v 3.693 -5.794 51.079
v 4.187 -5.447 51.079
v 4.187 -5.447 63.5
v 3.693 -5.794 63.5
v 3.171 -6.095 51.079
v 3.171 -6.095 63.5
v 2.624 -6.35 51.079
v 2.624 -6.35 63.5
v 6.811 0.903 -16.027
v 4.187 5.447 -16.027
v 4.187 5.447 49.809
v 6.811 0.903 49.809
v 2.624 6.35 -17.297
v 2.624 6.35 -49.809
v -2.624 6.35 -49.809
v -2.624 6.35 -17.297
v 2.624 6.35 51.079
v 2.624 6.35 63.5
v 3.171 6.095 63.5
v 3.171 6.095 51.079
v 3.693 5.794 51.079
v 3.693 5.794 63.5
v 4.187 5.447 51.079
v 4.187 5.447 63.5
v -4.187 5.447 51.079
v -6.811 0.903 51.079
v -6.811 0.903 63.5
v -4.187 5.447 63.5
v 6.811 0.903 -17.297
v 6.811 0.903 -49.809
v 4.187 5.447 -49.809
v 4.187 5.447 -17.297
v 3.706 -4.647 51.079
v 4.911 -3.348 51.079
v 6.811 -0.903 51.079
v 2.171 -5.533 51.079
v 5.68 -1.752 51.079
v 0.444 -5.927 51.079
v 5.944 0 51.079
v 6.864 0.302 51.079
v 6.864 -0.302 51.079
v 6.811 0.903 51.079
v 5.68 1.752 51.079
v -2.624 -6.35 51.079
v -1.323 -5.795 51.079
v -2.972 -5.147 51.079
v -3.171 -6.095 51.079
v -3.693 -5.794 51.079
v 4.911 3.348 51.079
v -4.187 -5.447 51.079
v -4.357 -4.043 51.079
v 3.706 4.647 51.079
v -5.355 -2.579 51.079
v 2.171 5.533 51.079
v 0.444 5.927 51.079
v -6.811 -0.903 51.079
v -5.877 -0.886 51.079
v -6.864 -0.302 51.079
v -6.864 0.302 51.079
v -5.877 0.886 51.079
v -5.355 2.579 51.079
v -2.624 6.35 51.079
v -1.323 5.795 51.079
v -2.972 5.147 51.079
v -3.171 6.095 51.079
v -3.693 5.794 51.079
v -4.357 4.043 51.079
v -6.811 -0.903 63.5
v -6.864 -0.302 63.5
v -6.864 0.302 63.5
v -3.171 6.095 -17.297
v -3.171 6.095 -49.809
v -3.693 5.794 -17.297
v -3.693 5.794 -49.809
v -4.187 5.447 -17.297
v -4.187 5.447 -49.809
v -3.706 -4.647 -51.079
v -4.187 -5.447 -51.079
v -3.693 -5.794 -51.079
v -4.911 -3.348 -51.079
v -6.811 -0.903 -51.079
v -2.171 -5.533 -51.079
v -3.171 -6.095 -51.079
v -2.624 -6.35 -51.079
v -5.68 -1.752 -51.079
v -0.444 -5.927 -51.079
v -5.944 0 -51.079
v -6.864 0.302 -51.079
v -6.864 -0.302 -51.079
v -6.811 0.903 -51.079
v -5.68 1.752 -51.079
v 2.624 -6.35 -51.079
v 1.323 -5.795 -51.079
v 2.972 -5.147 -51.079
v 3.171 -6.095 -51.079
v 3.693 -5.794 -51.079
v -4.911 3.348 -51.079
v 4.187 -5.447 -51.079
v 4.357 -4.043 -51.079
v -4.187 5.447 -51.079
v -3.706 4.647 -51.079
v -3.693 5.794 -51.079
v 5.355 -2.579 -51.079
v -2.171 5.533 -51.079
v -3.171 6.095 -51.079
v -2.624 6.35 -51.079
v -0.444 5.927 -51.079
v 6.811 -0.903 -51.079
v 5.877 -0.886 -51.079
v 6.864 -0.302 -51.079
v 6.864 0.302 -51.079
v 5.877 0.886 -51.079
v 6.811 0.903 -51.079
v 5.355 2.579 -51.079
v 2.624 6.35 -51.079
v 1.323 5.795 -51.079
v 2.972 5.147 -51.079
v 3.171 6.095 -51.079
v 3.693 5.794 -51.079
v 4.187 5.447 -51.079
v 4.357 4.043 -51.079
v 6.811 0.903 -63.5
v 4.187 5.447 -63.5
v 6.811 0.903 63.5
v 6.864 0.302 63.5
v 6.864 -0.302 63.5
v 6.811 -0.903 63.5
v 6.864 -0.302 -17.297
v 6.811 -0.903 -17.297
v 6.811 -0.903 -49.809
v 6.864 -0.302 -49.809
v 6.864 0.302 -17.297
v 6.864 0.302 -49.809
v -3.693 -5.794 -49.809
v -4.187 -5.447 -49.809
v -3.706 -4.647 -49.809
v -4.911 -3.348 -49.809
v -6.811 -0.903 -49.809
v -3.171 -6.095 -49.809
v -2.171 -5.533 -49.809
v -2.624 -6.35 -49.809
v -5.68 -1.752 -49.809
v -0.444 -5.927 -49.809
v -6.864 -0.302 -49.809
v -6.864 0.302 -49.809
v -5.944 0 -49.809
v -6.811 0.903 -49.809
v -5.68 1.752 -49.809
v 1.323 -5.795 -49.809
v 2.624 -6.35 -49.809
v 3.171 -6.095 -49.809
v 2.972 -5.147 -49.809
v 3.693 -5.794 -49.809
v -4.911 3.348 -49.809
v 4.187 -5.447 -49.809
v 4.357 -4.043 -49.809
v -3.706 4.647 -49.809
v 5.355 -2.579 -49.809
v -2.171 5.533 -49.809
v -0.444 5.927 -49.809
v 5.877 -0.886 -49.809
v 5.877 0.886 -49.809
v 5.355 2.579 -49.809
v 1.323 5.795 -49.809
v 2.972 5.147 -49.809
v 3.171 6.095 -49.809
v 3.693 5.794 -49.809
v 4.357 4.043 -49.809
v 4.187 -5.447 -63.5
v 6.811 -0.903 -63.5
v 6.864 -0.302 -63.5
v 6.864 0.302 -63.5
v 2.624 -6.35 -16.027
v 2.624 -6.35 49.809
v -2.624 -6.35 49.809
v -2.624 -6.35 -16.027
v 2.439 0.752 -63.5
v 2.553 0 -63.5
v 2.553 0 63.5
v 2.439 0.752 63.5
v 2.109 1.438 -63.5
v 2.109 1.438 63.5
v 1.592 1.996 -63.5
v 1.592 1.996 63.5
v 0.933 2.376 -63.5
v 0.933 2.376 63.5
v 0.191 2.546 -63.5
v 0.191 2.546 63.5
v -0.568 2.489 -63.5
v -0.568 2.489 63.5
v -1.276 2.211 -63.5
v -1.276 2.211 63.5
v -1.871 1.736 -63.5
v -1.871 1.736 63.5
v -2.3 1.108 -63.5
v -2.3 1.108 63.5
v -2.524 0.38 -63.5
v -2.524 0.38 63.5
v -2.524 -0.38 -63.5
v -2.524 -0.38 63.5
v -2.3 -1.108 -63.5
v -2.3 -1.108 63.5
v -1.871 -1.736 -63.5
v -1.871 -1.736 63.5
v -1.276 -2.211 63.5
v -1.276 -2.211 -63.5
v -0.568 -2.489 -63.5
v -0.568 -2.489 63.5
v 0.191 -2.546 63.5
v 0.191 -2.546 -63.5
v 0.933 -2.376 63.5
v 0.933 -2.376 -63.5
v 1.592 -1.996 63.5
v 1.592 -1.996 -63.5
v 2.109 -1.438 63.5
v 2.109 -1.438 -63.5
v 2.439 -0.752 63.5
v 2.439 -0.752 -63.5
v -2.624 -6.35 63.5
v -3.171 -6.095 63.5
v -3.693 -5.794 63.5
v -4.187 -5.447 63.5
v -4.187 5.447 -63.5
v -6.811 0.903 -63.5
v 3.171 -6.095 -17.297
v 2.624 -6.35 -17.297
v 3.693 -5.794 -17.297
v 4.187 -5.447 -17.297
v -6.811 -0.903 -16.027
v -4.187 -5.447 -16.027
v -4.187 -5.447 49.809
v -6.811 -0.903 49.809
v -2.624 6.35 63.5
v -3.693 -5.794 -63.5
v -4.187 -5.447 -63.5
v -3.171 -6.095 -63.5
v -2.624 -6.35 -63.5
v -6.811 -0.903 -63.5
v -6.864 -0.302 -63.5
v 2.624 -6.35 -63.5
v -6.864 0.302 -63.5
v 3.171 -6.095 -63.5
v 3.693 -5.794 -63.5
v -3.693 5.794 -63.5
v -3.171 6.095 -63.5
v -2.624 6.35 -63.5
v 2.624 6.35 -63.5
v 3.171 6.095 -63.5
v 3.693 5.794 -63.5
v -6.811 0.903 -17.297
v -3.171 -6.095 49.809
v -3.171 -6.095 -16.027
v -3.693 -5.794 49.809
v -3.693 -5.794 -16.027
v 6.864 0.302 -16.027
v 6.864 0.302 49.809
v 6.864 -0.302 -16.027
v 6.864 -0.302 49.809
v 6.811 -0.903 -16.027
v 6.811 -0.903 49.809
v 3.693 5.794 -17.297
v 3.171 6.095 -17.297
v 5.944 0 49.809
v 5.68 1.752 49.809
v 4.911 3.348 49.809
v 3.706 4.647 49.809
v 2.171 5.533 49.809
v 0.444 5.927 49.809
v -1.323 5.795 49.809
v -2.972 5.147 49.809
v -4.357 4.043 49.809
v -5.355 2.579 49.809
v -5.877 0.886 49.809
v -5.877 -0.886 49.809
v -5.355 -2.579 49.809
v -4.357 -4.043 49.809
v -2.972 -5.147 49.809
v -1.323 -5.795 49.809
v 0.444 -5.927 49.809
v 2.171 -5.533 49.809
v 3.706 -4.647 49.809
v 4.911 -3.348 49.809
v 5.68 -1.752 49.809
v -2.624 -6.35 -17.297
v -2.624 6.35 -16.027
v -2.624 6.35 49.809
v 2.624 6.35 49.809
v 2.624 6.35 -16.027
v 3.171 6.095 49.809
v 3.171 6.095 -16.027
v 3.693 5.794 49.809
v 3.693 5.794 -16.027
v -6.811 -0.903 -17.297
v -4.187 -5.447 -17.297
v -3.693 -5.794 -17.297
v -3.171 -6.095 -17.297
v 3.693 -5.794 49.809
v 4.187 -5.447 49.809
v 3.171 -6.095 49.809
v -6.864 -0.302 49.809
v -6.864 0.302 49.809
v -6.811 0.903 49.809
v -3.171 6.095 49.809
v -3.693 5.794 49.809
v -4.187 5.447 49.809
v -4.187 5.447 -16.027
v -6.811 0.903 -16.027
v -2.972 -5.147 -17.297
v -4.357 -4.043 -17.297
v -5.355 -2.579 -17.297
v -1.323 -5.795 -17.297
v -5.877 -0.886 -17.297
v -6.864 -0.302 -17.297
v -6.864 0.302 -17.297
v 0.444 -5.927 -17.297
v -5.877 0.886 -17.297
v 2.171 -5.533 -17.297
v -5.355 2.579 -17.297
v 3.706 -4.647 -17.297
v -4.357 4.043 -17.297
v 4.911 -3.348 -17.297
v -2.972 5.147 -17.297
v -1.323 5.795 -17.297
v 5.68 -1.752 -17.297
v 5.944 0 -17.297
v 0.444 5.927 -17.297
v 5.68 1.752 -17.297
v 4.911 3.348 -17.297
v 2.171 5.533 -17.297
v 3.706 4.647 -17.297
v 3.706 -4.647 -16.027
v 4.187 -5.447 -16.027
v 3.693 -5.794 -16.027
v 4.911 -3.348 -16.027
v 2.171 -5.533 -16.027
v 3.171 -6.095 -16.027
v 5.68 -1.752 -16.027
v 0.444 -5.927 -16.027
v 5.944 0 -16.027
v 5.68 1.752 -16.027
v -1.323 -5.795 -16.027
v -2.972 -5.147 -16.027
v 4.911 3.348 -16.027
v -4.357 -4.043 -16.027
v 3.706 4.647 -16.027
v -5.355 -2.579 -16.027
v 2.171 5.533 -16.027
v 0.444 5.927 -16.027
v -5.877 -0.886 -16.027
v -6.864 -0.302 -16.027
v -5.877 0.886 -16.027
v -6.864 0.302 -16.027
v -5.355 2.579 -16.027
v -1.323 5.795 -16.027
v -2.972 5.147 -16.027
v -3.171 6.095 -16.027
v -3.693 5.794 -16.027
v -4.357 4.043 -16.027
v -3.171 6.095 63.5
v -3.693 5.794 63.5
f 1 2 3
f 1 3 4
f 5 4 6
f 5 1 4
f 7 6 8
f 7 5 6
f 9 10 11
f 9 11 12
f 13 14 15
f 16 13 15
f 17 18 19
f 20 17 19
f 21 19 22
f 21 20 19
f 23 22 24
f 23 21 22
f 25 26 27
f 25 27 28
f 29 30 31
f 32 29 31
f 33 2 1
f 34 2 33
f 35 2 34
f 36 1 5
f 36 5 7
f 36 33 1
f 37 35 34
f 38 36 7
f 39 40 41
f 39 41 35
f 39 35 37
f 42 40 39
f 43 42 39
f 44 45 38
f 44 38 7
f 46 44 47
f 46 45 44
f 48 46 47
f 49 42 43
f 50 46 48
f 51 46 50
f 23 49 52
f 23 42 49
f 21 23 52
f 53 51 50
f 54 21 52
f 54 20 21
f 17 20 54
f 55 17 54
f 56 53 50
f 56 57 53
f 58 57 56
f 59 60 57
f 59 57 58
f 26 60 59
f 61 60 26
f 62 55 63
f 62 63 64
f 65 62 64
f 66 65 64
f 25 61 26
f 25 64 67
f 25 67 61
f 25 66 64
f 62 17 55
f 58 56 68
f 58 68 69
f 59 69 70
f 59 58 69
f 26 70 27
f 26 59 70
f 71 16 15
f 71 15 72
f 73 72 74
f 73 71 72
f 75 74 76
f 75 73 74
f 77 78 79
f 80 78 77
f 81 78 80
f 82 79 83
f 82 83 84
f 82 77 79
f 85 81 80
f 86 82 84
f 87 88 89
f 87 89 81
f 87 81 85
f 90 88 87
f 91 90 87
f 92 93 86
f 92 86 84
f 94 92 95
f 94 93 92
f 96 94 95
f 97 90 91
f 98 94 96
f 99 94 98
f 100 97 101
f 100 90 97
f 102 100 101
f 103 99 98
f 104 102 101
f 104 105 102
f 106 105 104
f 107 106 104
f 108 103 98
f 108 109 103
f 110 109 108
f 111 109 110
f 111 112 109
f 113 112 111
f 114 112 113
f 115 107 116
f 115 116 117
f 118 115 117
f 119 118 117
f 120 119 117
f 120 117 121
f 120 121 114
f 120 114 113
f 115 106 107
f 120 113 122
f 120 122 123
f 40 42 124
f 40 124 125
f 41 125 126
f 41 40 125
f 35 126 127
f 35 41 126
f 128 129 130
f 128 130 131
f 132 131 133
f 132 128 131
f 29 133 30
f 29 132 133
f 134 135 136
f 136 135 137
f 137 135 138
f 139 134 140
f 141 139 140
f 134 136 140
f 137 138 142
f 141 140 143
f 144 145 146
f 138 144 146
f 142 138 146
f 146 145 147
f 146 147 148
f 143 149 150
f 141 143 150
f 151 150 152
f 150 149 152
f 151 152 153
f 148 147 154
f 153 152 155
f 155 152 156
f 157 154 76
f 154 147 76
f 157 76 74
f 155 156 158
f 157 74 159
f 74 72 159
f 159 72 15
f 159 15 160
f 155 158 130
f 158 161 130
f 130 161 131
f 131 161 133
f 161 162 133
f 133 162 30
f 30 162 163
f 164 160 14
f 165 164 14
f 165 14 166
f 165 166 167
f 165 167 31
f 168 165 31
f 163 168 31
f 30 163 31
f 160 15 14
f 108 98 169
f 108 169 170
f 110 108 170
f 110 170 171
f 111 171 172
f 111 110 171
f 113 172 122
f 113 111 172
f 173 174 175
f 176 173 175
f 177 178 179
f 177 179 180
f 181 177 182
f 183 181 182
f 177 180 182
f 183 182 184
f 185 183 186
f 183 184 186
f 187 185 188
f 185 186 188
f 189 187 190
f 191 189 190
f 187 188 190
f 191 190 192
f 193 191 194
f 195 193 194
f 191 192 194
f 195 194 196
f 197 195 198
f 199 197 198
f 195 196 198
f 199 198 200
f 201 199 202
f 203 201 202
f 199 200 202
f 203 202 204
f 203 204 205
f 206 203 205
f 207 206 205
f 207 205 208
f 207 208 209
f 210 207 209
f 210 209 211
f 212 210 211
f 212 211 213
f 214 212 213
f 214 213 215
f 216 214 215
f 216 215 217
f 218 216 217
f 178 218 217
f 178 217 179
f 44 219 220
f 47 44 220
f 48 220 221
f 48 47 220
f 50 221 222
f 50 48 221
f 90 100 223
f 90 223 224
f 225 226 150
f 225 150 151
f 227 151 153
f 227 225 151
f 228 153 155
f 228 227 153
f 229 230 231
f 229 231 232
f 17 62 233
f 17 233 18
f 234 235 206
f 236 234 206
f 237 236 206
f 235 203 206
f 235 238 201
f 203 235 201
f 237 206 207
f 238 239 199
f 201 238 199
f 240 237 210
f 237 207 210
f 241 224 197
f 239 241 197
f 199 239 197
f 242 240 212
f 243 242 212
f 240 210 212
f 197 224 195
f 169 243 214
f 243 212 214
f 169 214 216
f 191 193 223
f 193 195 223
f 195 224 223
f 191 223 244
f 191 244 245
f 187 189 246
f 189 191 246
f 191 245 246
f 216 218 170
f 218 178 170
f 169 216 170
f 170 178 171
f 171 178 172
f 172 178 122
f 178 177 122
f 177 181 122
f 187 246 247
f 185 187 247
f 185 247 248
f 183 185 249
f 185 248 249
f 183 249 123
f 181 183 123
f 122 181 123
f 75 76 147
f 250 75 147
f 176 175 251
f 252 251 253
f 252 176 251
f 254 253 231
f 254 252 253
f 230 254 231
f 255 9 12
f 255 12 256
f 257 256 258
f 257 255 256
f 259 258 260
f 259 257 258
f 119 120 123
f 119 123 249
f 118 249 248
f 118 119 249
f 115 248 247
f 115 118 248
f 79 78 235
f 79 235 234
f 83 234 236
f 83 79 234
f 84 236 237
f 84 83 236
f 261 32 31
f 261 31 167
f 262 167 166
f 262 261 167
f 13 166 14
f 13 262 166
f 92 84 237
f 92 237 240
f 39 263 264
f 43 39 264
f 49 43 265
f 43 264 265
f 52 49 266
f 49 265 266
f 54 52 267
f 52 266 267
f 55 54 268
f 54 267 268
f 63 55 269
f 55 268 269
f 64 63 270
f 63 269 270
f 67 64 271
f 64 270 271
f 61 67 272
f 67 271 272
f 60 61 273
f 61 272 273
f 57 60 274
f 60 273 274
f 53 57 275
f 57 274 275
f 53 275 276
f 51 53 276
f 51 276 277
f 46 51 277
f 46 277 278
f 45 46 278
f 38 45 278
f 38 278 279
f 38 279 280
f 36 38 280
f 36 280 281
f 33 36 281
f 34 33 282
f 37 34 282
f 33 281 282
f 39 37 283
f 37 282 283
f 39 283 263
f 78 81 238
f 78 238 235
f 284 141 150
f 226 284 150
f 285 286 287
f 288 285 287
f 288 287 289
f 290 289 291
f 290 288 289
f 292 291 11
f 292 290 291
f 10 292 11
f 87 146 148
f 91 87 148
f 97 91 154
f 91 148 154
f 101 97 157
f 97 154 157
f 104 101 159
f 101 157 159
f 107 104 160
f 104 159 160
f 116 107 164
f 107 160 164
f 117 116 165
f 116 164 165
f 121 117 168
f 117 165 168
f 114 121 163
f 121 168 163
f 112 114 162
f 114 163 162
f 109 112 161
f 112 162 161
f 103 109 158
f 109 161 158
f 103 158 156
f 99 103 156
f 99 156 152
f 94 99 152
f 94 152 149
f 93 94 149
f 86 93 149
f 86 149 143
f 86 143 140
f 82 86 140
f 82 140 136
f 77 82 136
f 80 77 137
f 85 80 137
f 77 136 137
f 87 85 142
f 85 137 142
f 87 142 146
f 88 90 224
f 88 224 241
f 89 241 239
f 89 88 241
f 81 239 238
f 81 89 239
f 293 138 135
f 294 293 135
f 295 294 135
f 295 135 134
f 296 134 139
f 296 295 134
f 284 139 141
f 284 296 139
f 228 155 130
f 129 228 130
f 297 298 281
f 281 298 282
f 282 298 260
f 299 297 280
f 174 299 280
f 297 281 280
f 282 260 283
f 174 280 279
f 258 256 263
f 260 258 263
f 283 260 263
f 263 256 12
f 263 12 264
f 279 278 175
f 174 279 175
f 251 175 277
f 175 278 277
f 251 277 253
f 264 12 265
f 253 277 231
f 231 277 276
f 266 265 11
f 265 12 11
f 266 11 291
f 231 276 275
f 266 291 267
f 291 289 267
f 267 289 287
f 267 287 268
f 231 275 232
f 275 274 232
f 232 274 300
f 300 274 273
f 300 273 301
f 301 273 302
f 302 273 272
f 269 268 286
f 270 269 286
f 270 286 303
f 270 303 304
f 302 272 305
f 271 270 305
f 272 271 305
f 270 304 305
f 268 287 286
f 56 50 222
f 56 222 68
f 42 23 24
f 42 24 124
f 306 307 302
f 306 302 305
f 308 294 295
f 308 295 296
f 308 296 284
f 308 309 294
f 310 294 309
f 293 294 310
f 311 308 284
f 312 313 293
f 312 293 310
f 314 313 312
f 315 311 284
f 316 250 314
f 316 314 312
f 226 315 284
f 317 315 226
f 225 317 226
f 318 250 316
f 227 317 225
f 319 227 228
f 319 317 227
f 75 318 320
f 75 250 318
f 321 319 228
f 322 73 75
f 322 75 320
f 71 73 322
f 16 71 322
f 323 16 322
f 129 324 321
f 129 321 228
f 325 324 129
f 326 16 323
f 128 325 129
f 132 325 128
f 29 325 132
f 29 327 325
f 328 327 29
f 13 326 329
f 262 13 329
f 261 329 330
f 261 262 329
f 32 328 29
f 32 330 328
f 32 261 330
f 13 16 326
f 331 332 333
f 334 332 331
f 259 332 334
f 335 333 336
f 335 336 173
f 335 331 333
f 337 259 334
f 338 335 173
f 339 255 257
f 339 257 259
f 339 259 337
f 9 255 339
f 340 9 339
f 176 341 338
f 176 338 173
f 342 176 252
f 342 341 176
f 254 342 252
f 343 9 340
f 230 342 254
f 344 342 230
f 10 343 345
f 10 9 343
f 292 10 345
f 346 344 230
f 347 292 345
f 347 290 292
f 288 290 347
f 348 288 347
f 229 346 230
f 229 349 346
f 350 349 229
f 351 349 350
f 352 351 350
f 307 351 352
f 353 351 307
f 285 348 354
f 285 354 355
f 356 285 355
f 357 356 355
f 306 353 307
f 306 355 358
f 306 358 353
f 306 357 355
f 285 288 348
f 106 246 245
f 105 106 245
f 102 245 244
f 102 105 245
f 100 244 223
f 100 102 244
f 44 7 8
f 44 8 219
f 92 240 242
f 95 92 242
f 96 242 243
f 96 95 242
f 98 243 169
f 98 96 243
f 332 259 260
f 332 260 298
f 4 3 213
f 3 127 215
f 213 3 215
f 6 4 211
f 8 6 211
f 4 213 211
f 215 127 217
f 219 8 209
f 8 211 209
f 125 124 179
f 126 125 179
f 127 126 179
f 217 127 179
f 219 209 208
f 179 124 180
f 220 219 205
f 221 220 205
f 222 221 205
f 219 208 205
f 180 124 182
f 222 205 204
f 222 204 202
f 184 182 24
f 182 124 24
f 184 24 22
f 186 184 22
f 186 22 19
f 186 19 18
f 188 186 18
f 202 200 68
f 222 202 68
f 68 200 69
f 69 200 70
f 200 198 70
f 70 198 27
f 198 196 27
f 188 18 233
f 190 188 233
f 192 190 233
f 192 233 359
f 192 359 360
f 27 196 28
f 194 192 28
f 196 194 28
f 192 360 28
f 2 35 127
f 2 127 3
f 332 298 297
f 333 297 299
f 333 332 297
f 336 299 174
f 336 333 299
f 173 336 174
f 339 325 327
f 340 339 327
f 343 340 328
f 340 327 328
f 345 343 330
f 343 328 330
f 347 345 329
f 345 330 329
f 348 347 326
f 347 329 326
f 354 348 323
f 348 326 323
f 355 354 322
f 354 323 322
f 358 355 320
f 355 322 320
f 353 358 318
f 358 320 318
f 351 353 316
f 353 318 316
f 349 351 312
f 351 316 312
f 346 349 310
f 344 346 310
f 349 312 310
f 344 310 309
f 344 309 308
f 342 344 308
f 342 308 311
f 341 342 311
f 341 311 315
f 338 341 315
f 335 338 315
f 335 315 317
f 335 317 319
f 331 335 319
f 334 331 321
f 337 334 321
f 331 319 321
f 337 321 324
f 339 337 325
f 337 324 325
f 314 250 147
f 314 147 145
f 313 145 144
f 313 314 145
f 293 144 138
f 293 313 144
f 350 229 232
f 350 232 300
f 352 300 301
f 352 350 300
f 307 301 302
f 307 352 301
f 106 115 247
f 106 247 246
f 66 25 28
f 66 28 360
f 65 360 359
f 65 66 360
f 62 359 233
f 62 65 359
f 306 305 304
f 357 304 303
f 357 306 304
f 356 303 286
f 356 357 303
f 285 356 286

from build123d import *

# Parameters (mm, degrees)
BOSS_EXTRUDE1_DEPTH            = 32.512
SKETCH2_R                      = 5.9436
BOSS_EXTRUDE2_DEPTH            = 1.27
SKETCH3_R                      = 5.9436
BOSS_EXTRUDE3_DEPTH            = 1.27
BOSS_EXTRUDE4_DEPTH            = 65.8368
BOSS_EXTRUDE5_DEPTH            = 12.4206
SKETCH6_R                      = 5.9436
BOSS_EXTRUDE6_DEPTH            = 1.27
BOSS_EXTRUDE7_DEPTH            = 12.4206
F_7_0_201_DIAMETER_HOLE1_D     = 5.1054
F_7_0_201_DIAMETER_HOLE1_DEPTH = 127


with BuildPart() as part:
    # Sketch1 → Boss-Extrude1 (new body)
    with BuildSketch(Plane.XY.offset(-17.2974)):
        with BuildLine():
            Line((-4.187390656, 5.447226632), (-6.811131972, 0.902773368))
            ThreePointArc((-6.811131972, 0.902773368), (-6.8707, 0), (-6.811131972, -0.902773368))
            Line((-6.811131972, -0.902773368), (-4.187390656, -5.447226632))
            ThreePointArc((-4.187390656, -5.447226632), (-3.43535, -5.950200742), (-2.623741315, -6.35))
            Line((-2.623741315, -6.35), (2.623741315, -6.35))
            ThreePointArc((2.623741315, -6.35), (3.43535, -5.950200742), (4.187390656, -5.447226632))
            Line((4.187390656, -5.447226632), (6.811131972, -0.902773368))
            ThreePointArc((6.811131972, -0.902773368), (6.8707, 0), (6.811131972, 0.902773368))
            Line((6.811131972, 0.902773368), (4.187390656, 5.447226632))
            ThreePointArc((4.187390656, 5.447226632), (3.43535, 5.950200742), (2.623741315, 6.35))
            Line((2.623741315, 6.35), (-2.623741315, 6.35))
            ThreePointArc((-2.623741315, 6.35), (-3.43535, 5.950200742), (-4.187390656, 5.447226632))
        make_face()
    extrude(amount=-BOSS_EXTRUDE1_DEPTH)

    # Sketch2 → Boss-Extrude2 (add)
    with BuildSketch(Plane(origin=(0, 0, -49.8094), x_dir=(-1, 0, 0), z_dir=(0, 0, -1))):
        Circle(SKETCH2_R)
    extrude(amount=BOSS_EXTRUDE2_DEPTH)

    # Sketch3 → Boss-Extrude3 (add)
    with BuildSketch(Plane.XY.offset(-17.2974)):
        Circle(SKETCH3_R)
    extrude(amount=BOSS_EXTRUDE3_DEPTH)

    # Sketch4 → Boss-Extrude4 (add)
    with BuildSketch(Plane(origin=(0, 0, -16.0274), x_dir=(-1, 0, 0), z_dir=(0, 0, -1))):
        with BuildLine():
            Line((2.623741315, 6.35), (-2.623741315, 6.35))
            ThreePointArc((-2.623741315, 6.35), (-3.43535, 5.950200742), (-4.187390656, 5.447226632))
            Line((-4.187390656, 5.447226632), (-6.811131972, 0.902773368))
            ThreePointArc((-6.811131972, 0.902773368), (-6.8707, 0), (-6.811131972, -0.902773368))
            Line((-6.811131972, -0.902773368), (-4.187390656, -5.447226632))
            ThreePointArc((-4.187390656, -5.447226632), (-3.43535, -5.950200742), (-2.623741315, -6.35))
            Line((-2.623741315, -6.35), (2.623741315, -6.35))
            ThreePointArc((2.623741315, -6.35), (3.43535, -5.950200742), (4.187390656, -5.447226632))
            Line((4.187390656, -5.447226632), (6.811131972, -0.902773368))
            ThreePointArc((6.811131972, -0.902773368), (6.8707, 0), (6.811131972, 0.902773368))
            Line((6.811131972, 0.902773368), (4.187390656, 5.447226632))
            ThreePointArc((4.187390656, 5.447226632), (3.43535, 5.950200742), (2.623741315, 6.35))
        make_face()
    extrude(amount=-BOSS_EXTRUDE4_DEPTH)

    # Sketch5 → Boss-Extrude5 (add)
    with BuildSketch(Plane.XY.offset(-51.0794)):
        with BuildLine():
            Line((-4.187390656, 5.447226632), (-6.811131972, 0.902773368))
            ThreePointArc((-6.811131972, 0.902773368), (-6.8707, 0), (-6.811131972, -0.902773368))
            Line((-6.811131972, -0.902773368), (-4.187390656, -5.447226632))
            ThreePointArc((-4.187390656, -5.447226632), (-3.43535, -5.950200742), (-2.623741315, -6.35))
            Line((-2.623741315, -6.35), (2.623741315, -6.35))
            ThreePointArc((2.623741315, -6.35), (3.43535, -5.950200742), (4.187390656, -5.447226632))
            Line((4.187390656, -5.447226632), (6.811131972, -0.902773368))
            ThreePointArc((6.811131972, -0.902773368), (6.8707, 0), (6.811131972, 0.902773368))
            Line((6.811131972, 0.902773368), (4.187390656, 5.447226632))
            ThreePointArc((4.187390656, 5.447226632), (3.43535, 5.950200742), (2.623741315, 6.35))
            Line((2.623741315, 6.35), (-2.623741315, 6.35))
            ThreePointArc((-2.623741315, 6.35), (-3.43535, 5.950200742), (-4.187390656, 5.447226632))
        make_face()
    extrude(amount=-BOSS_EXTRUDE5_DEPTH)

    # Sketch6 → Boss-Extrude6 (add)
    with BuildSketch(Plane.XY.offset(49.8094)):
        Circle(SKETCH6_R)
    extrude(amount=BOSS_EXTRUDE6_DEPTH)

    # Sketch7 → Boss-Extrude7 (add)
    with BuildSketch(Plane(origin=(0, 0, 51.0794), x_dir=(-1, 0, 0), z_dir=(0, 0, -1))):
        with BuildLine():
            Line((6.811131972, 0.902773368), (4.187390656, 5.447226632))
            ThreePointArc((4.187390656, 5.447226632), (3.43535, 5.950200742), (2.623741315, 6.35))
            Line((2.623741315, 6.35), (-2.623741315, 6.35))
            ThreePointArc((-2.623741315, 6.35), (-3.43535, 5.950200742), (-4.187390656, 5.447226632))
            Line((-4.187390656, 5.447226632), (-6.811131972, 0.902773368))
            ThreePointArc((-6.811131972, 0.902773368), (-6.8707, 0), (-6.811131972, -0.902773368))
            Line((-6.811131972, -0.902773368), (-4.187390656, -5.447226632))
            ThreePointArc((-4.187390656, -5.447226632), (-3.43535, -5.950200742), (-2.623741315, -6.35))
            Line((-2.623741315, -6.35), (2.623741315, -6.35))
            ThreePointArc((2.623741315, -6.35), (3.43535, -5.950200742), (4.187390656, -5.447226632))
            Line((4.187390656, -5.447226632), (6.811131972, -0.902773368))
            ThreePointArc((6.811131972, -0.902773368), (6.8707, 0), (6.811131972, 0.902773368))
        make_face()
    extrude(amount=-BOSS_EXTRUDE7_DEPTH)

    # #7 (0.201) Diameter Hole1
    with Locations(Plane(origin=(0, 0, -63.5), x_dir=(-1, 0, 0), z_dir=(0, 0, -1))):
        with Locations((0, 0)):
            Hole(F_7_0_201_DIAMETER_HOLE1_D / 2, depth=F_7_0_201_DIAMETER_HOLE1_DEPTH)


solid = part.part
